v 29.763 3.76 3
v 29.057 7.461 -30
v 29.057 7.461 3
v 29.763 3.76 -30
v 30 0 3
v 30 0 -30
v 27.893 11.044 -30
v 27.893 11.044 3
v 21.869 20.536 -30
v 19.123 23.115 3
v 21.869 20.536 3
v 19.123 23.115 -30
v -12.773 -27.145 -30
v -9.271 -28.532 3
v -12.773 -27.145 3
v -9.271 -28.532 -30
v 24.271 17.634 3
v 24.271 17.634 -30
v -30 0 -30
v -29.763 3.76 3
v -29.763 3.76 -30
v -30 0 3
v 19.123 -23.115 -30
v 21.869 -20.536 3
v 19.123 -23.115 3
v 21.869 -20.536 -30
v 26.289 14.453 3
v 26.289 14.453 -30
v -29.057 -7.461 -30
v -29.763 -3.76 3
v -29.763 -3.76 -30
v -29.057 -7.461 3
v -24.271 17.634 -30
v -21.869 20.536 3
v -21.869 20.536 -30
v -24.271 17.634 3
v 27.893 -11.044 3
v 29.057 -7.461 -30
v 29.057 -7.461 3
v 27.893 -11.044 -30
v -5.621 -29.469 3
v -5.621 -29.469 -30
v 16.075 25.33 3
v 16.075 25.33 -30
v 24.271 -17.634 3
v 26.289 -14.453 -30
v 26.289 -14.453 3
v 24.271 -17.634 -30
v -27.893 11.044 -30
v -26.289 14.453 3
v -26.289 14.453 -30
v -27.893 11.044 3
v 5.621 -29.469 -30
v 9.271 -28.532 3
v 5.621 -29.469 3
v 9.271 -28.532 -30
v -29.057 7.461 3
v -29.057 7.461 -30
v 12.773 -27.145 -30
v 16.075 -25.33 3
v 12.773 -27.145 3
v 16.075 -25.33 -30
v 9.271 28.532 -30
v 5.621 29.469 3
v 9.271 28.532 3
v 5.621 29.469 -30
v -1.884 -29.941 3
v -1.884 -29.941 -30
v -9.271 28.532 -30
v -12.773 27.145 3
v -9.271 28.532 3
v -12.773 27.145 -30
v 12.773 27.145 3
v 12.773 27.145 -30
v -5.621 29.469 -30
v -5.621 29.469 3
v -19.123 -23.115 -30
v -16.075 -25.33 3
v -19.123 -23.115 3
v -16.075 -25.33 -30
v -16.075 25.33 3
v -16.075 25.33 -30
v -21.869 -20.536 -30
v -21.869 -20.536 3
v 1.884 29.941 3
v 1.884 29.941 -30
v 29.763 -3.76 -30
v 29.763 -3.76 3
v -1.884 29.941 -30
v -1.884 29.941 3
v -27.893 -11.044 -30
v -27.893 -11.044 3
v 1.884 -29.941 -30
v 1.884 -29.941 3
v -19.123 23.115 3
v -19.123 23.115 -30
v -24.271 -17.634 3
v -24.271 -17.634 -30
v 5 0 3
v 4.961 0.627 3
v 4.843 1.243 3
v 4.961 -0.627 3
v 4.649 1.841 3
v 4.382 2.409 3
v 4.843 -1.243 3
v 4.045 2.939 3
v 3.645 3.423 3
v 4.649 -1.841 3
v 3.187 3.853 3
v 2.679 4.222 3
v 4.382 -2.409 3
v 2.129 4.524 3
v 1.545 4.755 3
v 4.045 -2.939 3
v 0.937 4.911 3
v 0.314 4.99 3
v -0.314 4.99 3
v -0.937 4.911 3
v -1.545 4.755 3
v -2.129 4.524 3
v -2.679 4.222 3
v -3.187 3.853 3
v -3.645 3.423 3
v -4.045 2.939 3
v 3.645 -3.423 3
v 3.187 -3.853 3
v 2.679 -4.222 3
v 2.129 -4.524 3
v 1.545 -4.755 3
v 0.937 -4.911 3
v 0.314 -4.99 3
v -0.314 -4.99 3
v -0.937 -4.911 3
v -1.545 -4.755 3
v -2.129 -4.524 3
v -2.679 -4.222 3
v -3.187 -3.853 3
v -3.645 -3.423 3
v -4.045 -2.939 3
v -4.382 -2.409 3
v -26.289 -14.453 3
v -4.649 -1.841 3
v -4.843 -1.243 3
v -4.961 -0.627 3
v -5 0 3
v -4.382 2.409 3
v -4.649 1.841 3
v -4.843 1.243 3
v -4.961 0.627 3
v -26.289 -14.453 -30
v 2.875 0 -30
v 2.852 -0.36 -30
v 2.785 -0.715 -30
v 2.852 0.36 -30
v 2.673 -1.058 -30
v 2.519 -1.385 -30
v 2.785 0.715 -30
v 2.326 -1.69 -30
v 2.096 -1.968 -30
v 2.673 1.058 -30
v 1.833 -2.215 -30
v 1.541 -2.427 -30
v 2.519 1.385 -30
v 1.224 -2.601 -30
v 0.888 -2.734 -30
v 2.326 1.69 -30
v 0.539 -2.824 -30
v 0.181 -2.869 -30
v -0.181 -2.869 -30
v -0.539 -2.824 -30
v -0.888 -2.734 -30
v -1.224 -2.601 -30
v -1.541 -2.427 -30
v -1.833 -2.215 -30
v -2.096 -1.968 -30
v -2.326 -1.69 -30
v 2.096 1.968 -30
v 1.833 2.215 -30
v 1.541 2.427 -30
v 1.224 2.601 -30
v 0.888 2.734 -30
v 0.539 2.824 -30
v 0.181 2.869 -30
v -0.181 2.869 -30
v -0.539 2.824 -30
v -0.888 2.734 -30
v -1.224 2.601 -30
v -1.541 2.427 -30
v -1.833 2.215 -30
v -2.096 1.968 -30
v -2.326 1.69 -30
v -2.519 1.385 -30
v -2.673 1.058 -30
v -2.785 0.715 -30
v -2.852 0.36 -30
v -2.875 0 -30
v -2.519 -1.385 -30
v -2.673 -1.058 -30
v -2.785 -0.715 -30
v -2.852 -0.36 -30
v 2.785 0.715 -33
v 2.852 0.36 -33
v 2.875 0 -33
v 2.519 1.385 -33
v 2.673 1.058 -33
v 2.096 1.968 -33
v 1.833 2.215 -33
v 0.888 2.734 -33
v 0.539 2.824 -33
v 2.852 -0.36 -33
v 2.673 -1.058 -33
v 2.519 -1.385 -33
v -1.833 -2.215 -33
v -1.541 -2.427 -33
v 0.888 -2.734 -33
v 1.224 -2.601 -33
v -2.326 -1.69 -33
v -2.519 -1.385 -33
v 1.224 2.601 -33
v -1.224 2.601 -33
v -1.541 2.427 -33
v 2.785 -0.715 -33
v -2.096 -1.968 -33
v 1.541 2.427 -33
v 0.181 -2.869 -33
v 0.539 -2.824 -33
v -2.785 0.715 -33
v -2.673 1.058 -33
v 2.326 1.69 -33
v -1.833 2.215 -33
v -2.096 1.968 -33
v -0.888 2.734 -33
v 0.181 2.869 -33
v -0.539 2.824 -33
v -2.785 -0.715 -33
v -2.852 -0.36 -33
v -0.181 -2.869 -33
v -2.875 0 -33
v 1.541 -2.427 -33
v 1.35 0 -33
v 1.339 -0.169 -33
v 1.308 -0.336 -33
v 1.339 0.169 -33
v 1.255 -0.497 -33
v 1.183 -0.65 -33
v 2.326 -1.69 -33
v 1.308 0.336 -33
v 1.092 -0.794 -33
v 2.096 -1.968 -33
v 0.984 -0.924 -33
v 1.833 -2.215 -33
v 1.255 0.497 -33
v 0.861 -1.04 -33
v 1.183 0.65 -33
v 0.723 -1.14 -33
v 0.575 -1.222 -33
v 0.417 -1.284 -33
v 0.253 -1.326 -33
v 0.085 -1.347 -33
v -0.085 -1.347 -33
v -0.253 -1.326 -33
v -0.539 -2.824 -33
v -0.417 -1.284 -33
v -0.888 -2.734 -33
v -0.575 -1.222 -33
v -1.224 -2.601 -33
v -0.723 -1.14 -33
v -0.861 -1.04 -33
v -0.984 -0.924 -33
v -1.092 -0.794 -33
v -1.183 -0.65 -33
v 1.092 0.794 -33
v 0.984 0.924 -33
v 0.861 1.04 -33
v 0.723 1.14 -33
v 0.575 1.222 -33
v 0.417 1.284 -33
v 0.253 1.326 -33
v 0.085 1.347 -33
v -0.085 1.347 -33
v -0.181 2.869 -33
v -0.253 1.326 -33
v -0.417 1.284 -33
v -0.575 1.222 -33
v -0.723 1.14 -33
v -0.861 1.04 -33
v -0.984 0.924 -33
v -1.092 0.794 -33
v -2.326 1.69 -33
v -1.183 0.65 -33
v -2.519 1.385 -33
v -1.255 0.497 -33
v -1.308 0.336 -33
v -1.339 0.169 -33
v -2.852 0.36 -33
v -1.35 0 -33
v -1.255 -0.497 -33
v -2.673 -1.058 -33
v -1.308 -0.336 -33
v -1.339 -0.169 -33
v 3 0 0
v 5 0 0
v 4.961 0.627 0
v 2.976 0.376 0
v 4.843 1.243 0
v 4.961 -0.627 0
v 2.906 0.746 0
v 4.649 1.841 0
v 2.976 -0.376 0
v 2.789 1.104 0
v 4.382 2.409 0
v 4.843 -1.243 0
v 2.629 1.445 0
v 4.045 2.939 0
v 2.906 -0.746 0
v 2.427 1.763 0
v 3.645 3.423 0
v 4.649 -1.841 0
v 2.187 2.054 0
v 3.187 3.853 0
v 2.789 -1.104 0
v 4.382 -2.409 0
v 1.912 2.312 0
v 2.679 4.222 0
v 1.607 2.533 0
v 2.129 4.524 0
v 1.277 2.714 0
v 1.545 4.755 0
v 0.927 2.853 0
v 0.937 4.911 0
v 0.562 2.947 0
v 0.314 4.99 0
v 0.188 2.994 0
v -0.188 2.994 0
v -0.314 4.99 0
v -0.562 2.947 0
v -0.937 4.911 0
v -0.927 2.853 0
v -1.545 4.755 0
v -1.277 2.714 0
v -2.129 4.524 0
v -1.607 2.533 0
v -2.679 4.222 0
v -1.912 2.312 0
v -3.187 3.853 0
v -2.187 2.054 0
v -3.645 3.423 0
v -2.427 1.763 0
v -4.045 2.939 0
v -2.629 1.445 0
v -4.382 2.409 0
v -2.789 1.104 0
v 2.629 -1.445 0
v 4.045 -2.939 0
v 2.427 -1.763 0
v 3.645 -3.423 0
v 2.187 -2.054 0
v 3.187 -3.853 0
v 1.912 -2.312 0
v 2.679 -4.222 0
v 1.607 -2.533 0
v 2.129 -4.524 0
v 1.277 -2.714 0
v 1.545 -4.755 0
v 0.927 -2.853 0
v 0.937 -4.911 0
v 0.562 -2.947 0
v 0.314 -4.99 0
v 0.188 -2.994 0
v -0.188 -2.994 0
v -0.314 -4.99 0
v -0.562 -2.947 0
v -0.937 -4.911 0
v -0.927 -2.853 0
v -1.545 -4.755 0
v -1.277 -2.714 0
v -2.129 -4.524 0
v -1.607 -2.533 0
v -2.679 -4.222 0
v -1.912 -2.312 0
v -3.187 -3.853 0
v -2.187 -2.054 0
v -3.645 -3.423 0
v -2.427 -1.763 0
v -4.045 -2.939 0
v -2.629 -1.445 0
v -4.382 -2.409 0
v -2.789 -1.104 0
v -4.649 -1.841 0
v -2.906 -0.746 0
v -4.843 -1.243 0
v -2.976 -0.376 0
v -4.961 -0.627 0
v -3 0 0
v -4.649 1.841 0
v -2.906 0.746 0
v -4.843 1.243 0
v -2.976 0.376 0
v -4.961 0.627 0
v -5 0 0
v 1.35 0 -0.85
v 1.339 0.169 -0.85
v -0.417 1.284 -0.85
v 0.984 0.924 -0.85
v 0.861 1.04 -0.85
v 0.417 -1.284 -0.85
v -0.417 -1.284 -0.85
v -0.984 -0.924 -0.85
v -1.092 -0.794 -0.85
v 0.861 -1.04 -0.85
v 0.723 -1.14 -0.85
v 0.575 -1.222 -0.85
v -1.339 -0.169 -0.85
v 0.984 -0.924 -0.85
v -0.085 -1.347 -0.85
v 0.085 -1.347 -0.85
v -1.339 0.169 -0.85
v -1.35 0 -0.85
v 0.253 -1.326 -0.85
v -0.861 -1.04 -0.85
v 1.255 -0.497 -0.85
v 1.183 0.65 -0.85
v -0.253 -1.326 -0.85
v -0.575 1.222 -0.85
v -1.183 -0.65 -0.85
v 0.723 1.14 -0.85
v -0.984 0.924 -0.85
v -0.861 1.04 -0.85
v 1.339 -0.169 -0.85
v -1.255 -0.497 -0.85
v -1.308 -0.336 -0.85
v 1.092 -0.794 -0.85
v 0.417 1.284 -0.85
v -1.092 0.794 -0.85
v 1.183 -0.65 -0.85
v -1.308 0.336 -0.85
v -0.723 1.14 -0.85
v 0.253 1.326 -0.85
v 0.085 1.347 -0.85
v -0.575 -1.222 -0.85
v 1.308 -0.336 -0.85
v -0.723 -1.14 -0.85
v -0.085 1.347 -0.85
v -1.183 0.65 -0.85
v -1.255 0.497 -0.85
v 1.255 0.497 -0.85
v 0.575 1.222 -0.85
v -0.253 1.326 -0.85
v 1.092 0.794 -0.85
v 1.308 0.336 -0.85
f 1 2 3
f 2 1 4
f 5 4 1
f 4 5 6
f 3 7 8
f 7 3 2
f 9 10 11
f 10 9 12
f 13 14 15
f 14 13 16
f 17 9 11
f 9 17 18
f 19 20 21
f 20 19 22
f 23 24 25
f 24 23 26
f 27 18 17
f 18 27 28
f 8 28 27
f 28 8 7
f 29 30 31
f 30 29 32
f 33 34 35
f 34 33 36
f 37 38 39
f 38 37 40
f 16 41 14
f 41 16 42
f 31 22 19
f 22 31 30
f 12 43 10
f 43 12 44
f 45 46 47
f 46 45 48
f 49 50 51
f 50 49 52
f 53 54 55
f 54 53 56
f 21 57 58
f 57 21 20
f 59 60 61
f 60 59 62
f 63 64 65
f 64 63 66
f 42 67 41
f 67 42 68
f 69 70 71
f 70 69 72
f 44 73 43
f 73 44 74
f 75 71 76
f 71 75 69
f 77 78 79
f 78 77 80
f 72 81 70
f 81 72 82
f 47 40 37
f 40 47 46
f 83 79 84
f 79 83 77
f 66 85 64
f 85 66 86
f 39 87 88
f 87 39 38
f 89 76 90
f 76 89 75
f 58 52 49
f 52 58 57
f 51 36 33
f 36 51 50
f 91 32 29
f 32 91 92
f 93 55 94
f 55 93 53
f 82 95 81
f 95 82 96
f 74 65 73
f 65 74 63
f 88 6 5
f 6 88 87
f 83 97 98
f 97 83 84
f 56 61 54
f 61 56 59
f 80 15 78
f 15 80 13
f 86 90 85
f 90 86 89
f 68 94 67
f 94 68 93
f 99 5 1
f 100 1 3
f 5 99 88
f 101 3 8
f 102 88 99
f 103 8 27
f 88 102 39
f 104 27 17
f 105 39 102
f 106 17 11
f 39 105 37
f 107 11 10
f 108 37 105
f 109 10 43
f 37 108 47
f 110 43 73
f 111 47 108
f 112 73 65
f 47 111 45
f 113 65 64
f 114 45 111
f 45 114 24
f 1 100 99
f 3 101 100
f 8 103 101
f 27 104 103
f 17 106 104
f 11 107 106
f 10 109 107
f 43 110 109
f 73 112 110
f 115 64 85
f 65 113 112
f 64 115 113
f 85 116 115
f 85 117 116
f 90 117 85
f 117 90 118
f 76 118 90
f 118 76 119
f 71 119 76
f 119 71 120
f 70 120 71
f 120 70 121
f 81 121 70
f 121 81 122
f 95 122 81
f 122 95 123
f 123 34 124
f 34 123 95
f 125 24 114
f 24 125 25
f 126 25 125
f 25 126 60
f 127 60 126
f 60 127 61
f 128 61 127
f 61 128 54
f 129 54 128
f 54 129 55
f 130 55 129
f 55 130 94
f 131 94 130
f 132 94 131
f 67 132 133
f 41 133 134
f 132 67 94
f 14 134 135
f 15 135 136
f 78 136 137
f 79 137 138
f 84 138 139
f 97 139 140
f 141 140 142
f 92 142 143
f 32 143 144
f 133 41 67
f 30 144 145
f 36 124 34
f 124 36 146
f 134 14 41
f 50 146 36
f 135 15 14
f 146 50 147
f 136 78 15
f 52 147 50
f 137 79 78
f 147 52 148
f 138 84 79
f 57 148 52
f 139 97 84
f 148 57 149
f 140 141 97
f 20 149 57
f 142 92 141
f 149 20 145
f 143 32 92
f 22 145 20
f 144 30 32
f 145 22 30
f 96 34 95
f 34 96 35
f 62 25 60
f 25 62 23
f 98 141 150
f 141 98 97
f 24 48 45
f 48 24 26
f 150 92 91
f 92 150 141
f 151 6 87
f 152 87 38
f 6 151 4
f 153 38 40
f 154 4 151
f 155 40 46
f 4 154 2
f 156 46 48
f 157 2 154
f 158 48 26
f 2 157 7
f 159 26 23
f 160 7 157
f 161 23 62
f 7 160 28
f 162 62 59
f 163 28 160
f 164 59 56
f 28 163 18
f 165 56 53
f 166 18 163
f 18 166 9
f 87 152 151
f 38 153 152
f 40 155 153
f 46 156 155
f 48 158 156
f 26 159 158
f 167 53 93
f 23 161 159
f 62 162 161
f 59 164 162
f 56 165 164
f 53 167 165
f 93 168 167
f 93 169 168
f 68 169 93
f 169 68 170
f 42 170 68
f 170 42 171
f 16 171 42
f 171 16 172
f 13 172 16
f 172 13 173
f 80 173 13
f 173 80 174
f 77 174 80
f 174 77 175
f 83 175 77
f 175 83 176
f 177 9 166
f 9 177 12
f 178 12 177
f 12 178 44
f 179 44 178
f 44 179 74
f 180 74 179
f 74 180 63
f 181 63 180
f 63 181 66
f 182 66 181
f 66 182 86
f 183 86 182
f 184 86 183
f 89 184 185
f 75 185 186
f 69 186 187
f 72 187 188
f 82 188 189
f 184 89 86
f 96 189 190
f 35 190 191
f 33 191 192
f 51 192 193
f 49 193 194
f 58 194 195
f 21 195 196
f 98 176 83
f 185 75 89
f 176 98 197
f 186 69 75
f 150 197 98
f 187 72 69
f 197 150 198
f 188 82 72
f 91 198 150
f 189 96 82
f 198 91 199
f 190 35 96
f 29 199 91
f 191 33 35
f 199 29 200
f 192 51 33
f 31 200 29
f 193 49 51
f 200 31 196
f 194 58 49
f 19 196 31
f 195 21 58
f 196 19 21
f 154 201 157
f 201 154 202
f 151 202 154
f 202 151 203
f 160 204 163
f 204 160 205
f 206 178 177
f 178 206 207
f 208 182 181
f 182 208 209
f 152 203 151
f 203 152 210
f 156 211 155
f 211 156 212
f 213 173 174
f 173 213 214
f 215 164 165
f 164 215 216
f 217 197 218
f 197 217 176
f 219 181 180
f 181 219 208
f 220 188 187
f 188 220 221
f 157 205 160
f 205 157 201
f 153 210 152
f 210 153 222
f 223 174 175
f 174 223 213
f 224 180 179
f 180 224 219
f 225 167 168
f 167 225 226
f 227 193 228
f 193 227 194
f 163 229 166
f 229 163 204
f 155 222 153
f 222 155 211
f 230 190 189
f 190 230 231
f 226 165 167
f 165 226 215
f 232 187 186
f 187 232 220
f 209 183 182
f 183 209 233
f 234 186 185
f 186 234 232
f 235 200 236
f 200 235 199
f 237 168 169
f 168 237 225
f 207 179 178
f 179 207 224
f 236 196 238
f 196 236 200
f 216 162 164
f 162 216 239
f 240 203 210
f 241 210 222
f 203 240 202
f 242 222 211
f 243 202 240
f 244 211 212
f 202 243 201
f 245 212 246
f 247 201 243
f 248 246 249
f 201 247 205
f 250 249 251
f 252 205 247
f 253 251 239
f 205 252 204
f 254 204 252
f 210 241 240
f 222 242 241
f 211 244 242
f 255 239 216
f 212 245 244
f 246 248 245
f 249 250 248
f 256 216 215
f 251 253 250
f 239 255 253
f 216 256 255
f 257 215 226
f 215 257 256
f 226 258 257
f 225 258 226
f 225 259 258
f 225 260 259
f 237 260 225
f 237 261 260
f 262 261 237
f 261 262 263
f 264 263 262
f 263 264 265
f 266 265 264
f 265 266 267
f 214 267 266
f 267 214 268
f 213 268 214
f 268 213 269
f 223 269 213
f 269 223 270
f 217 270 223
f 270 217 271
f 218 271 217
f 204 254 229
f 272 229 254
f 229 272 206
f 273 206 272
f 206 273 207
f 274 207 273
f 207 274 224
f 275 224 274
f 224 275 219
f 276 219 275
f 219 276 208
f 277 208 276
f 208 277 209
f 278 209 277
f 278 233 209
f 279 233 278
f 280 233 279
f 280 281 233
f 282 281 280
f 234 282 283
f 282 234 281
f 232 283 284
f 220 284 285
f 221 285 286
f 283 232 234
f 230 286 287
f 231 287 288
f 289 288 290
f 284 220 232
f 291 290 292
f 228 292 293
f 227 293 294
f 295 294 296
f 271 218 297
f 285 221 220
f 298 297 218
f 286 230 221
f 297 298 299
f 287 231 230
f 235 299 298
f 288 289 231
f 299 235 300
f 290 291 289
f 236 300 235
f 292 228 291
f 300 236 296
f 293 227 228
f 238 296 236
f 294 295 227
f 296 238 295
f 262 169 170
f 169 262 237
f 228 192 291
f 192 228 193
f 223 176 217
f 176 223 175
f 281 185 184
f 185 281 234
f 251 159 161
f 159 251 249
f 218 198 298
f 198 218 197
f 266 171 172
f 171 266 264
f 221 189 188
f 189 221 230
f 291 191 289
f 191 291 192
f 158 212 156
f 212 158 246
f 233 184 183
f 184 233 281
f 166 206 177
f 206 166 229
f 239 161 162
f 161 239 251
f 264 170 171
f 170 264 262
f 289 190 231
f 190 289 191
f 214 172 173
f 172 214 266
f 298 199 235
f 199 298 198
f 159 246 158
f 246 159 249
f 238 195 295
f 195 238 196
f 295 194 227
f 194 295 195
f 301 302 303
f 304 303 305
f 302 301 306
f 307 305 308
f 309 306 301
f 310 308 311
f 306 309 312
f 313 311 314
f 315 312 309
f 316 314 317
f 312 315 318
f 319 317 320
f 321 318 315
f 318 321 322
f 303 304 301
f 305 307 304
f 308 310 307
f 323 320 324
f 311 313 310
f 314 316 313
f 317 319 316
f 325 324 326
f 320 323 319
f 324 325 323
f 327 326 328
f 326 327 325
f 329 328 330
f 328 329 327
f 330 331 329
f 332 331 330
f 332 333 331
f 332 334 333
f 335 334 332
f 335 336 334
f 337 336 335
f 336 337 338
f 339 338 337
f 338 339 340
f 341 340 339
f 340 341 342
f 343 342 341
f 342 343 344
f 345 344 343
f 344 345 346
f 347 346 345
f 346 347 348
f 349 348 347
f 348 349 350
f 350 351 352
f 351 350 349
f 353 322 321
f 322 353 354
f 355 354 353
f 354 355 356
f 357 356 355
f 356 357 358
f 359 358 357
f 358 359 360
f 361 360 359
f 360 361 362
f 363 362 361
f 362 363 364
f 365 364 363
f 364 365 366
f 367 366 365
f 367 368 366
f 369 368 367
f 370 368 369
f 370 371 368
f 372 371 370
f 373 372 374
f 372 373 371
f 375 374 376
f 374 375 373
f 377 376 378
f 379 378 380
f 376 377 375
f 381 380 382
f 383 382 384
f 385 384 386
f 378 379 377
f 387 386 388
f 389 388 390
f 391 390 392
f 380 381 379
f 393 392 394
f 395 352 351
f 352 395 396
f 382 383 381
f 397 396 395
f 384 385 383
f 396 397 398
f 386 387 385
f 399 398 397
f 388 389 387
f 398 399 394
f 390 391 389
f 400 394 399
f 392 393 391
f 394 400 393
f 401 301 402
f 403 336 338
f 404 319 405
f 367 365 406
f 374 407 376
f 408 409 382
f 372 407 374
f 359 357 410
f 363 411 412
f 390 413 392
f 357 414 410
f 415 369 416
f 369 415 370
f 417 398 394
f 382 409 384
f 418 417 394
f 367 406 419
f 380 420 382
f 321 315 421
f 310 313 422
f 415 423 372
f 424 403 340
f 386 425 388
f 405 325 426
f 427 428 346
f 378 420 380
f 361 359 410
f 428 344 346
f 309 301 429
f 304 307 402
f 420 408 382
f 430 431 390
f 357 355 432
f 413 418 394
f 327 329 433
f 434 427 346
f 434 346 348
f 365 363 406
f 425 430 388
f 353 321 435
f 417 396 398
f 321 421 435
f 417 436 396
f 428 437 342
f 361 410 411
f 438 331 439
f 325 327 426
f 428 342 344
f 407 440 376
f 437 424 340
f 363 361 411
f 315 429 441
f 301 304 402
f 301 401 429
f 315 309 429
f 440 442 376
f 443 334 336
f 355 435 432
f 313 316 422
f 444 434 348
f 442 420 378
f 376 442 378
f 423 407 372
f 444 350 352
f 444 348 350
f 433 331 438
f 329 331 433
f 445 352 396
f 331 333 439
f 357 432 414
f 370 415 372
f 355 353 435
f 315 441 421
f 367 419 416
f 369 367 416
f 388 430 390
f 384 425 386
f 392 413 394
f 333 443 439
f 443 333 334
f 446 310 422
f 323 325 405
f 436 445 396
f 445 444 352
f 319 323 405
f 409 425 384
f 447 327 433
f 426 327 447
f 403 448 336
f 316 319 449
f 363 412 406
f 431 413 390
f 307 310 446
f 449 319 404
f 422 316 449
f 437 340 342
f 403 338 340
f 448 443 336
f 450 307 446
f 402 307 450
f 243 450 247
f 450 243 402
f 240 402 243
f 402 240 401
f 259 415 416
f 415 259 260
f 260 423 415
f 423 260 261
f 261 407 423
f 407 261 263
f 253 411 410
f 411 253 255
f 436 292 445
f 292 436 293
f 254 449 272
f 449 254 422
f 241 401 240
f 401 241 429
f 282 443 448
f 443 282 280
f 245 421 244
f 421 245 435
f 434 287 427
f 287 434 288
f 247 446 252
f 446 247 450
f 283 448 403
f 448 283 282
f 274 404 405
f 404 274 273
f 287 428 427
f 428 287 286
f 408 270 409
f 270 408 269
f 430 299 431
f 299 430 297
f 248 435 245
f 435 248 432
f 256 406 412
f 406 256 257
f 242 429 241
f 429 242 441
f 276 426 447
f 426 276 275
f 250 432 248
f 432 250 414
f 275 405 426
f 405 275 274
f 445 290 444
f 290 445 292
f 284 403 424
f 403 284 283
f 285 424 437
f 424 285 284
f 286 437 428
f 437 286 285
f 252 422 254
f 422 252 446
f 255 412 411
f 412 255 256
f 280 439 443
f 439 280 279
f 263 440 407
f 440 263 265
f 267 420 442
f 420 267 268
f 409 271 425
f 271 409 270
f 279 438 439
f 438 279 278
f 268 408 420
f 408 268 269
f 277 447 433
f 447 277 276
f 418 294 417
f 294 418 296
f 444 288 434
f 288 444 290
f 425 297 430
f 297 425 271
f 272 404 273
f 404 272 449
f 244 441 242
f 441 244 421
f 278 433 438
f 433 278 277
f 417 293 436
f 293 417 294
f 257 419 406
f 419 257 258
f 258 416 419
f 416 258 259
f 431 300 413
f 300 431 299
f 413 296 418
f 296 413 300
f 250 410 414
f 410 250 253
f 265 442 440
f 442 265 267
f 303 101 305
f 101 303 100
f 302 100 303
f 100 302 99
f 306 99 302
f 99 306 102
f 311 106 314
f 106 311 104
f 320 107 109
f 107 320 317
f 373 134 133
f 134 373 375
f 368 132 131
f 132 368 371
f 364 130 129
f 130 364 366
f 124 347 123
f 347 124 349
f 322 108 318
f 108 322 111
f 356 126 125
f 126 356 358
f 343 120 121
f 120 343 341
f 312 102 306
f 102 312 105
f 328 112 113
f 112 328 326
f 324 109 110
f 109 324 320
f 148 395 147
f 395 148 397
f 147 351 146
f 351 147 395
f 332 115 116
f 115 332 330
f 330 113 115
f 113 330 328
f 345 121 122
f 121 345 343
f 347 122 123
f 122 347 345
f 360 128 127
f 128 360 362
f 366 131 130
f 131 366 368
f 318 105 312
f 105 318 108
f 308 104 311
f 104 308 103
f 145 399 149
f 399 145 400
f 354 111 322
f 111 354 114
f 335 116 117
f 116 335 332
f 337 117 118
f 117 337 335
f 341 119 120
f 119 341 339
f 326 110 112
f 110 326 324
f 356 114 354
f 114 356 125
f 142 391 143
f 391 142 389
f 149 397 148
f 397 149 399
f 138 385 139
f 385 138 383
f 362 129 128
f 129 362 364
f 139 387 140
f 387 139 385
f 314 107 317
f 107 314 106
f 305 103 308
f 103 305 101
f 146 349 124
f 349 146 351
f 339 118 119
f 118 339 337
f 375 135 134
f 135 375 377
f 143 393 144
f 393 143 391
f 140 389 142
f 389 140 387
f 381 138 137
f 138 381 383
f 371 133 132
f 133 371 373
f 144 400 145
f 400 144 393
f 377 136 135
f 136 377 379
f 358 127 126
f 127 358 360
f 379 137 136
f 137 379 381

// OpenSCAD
$fn = 50;

difference() {
	union() {
		translate(v = [0, 0, -30.0]) {
			cylinder(h = 33, r = 30.0);
		}
		#translate(v = [0, 0, -33.0]) {
			cylinder(h = 33, r = 2.875);
		}
	}
	union() {
		translate(v = [0, 0, 0]) {
			rotate(a = [0, 0, 0]) {
				difference() {
					union() {
						translate(v = [0, 0, -33.0]) {
							cylinder(h = 33, r = 1.0);
						}
						translate(v = [0, 0, -0.85]) {
							cylinder(h = 0.85, r1 = 1.35, r2 = 3.0);
						}
						translate(v = [0, 0, -33.0]) {
							cylinder(h = 33, r = 1.35);
						}
						translate(v = [0, 0, -33.0]) {
							cylinder(h = 33, r = 1.0);
						}
					}
					union();
				}
			}
		}
		#cylinder(h = 3, r = 5.0);
	}
}
